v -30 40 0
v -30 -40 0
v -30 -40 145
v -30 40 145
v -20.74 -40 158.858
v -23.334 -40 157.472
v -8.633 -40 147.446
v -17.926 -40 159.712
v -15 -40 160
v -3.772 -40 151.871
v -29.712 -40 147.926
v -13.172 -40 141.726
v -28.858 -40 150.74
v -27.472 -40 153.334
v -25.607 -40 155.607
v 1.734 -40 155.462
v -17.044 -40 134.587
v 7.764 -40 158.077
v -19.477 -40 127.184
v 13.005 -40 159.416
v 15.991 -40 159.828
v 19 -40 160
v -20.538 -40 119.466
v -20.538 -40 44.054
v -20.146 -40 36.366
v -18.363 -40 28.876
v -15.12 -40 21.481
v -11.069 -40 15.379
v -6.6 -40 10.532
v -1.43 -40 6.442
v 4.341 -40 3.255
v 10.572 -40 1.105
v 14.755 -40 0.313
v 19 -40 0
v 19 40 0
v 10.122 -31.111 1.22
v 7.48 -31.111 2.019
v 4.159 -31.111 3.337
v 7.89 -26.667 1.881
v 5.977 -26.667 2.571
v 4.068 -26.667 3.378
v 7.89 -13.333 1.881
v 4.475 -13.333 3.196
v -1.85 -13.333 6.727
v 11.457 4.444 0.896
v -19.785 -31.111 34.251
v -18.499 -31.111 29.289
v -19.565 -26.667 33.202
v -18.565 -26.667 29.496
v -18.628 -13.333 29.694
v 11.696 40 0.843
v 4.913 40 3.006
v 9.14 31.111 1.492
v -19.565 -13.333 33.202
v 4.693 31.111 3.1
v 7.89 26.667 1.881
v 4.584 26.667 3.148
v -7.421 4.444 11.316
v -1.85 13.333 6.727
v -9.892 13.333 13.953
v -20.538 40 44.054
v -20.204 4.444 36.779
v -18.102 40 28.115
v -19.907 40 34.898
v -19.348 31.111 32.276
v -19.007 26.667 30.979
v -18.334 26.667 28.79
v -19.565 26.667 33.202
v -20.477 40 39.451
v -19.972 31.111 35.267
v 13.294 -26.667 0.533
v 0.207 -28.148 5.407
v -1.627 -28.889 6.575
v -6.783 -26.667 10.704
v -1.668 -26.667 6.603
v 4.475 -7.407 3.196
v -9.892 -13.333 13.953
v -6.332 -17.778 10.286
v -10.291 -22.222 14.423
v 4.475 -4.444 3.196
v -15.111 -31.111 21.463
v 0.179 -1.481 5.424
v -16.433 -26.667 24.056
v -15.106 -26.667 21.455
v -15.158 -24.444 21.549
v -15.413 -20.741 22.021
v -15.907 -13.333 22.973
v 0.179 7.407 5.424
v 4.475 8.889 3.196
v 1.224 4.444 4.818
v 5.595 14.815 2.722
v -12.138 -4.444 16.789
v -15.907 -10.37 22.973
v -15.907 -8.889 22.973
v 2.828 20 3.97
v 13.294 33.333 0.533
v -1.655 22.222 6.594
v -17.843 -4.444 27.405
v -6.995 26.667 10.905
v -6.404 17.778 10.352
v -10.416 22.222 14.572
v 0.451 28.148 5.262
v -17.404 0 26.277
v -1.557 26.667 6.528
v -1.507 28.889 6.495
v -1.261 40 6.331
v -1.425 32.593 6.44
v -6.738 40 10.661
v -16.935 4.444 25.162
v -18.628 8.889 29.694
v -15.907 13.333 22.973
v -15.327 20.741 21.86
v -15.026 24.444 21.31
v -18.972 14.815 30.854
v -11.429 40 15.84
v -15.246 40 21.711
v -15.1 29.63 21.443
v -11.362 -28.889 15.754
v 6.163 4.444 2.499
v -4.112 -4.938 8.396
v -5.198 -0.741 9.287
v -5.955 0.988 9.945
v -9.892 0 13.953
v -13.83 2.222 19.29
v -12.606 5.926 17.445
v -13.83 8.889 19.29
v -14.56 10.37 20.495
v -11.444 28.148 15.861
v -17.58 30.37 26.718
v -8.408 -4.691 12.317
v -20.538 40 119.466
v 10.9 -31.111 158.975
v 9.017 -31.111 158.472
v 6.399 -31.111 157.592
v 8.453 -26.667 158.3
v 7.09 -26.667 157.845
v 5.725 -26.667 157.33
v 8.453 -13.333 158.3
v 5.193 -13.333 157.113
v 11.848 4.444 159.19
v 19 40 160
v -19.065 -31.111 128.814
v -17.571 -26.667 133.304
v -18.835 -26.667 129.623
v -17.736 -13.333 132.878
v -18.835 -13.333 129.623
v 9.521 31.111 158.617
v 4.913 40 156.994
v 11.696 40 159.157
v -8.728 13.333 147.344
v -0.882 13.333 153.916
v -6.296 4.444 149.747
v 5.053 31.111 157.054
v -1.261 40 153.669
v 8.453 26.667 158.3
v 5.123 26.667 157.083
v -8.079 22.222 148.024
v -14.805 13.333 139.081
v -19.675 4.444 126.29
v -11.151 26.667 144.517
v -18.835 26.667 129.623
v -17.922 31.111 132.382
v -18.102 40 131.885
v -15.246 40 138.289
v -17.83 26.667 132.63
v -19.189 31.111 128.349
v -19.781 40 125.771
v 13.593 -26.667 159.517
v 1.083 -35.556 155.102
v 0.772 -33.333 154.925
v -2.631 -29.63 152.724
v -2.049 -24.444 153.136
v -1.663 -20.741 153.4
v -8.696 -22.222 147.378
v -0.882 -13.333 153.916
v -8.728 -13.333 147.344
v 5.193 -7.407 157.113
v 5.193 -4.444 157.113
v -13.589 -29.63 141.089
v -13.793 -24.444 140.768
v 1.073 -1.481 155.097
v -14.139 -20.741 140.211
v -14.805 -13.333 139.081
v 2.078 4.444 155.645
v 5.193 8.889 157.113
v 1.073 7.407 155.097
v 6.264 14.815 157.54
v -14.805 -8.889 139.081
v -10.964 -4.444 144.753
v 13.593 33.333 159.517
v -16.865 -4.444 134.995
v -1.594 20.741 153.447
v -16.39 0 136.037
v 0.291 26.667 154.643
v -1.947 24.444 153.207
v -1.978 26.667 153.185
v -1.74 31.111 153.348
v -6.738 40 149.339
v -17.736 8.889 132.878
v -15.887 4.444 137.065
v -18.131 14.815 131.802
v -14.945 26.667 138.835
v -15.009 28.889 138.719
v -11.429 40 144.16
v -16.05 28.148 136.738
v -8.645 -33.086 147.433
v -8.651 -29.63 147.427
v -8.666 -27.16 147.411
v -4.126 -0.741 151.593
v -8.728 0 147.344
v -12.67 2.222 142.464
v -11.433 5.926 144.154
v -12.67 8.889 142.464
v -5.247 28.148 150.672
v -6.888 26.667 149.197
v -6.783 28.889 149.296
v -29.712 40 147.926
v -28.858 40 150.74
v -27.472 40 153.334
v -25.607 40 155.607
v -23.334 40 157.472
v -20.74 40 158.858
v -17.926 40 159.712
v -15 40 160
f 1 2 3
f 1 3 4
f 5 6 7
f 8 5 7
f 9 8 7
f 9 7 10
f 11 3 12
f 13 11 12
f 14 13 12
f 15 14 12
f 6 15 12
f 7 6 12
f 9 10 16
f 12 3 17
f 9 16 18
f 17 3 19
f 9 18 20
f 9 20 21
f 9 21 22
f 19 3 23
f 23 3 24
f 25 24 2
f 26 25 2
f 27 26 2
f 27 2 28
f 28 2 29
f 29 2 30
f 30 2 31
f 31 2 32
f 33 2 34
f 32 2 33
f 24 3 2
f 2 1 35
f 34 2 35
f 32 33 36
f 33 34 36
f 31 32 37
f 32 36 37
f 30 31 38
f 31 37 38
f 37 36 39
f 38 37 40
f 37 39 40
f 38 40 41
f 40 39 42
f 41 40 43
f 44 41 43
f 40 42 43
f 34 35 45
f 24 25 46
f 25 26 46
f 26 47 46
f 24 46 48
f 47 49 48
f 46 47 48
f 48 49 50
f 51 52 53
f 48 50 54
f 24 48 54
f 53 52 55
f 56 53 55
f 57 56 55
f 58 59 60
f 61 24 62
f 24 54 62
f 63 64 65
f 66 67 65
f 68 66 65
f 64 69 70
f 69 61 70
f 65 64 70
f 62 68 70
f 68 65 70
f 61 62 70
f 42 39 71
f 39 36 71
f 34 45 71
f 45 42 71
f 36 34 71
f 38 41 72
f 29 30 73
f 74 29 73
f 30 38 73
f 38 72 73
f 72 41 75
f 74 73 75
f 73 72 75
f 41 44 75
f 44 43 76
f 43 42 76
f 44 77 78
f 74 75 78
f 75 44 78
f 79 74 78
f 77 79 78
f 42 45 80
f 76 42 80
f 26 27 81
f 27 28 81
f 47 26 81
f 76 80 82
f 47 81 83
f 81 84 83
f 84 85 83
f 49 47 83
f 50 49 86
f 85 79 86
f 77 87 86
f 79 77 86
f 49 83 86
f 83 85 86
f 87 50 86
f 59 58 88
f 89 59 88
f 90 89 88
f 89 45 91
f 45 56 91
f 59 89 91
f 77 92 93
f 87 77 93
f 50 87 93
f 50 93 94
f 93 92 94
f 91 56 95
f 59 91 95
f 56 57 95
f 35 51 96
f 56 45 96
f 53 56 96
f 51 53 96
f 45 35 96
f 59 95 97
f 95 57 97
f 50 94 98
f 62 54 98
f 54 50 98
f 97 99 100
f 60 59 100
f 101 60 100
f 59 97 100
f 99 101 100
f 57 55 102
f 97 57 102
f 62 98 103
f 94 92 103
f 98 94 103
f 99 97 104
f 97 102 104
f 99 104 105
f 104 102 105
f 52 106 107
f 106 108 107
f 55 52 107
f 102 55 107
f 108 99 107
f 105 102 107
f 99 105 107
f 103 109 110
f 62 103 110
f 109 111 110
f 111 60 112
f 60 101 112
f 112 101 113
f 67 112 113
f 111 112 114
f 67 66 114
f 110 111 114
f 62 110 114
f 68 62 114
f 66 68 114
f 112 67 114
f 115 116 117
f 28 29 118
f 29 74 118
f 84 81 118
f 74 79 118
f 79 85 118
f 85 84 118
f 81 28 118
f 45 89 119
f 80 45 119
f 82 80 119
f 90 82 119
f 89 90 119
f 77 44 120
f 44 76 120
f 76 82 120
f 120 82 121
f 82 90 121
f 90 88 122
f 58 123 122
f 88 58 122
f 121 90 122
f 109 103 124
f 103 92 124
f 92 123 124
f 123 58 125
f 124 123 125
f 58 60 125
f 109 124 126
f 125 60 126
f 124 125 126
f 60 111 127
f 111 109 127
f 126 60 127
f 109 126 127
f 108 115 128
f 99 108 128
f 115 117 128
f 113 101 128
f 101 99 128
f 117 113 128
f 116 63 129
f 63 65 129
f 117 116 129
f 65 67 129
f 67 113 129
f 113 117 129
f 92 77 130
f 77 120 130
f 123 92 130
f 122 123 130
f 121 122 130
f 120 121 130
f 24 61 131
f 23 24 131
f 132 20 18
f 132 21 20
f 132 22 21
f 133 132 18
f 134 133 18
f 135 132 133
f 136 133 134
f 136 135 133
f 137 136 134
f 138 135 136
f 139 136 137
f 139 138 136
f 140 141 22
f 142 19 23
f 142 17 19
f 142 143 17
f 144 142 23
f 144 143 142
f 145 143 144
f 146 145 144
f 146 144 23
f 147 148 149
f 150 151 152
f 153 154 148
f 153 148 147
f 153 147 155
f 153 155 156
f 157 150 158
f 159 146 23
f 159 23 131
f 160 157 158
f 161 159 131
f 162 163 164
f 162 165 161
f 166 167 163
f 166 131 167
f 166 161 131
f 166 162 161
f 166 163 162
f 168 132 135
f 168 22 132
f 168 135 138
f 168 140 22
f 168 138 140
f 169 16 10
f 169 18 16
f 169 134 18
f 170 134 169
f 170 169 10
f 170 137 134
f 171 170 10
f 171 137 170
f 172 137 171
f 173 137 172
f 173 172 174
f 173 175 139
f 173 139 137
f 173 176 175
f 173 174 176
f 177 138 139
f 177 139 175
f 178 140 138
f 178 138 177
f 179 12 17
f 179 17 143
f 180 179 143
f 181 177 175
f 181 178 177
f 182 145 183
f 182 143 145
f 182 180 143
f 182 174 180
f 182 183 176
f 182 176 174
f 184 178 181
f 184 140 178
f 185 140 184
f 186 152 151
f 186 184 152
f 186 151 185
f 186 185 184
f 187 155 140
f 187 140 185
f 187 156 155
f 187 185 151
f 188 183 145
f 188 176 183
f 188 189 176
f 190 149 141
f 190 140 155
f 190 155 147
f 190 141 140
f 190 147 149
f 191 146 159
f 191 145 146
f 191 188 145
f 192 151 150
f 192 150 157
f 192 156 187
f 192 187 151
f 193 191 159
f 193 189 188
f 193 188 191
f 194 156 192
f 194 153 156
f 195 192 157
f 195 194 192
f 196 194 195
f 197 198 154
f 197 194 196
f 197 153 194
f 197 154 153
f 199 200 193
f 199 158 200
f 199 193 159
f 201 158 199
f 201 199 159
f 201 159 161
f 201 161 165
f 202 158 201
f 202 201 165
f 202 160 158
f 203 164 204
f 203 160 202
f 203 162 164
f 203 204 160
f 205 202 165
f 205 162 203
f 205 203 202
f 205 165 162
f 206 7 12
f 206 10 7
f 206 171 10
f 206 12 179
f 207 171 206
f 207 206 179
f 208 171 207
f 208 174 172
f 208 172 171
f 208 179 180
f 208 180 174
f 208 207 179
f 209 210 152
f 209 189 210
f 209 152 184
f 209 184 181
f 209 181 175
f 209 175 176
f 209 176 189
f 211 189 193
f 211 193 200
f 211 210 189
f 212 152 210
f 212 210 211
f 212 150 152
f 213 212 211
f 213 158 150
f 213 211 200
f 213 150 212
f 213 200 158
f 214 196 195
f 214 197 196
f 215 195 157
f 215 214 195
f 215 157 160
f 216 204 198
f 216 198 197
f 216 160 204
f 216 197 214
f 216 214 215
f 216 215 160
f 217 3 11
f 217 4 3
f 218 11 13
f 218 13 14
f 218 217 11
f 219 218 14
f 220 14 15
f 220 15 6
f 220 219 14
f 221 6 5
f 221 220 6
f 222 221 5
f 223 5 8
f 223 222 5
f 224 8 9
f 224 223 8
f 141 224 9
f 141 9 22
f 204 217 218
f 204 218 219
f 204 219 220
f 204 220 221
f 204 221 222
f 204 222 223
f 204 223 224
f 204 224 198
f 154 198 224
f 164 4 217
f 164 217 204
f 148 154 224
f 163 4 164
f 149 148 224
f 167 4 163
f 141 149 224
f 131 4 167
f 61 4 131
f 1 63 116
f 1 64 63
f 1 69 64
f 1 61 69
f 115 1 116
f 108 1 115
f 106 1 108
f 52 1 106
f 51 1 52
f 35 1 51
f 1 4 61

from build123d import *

# Parameters (mm, degrees)
SKETCH1_W           = 60
SKETCH1_H           = 80
BOSS_EXTRUDE1_DEPTH = 160
CUT_EXTRUDE1_DEPTH  = 182.383571472
FILLET1_R           = 15


with BuildPart() as part:
    # Sketch1 → Boss-Extrude1 (new body)
    with BuildSketch(Plane.XY):
        Rectangle(SKETCH1_W, SKETCH1_H)
    extrude(amount=BOSS_EXTRUDE1_DEPTH)

    # Sketch2 → Cut-Extrude1 (cut, through all)
    with BuildSketch(Plane(origin=(0, 40, 0), x_dir=(1, 0, 0), z_dir=(0, 1, 0))):
        with BuildLine():
            Line((-20.538426818, -44.05376626), (-20.538426818, -80))
            Line((-20.538426818, -80), (30, -80))
            Line((30, -80), (30, 0))
            Line((30, 0), (19, 0))
            add(Edge.make_bspline(
                [(19, 0), (-4.370713607, -0.406174328), (-21.495622782, -22.117426015), (-20.538426818, -44.05376626)],
                knots=[0, 0, 0, 0, 1, 1, 1, 1], degree=3))
        make_face()
        with BuildLine():
            Line((-20.538426818, -80), (-20.538426818, -115.94623374))
            Line((-20.538426818, -115.94623374), (-20.538426818, -119.465924684))
            add(Edge.make_bspline(
                [(19, -160), (-3.118929784, -159.61558121), (-19.643213017, -140.147251157), (-20.538426818, -119.465924684)],
                knots=[0, 0, 0, 0, 0.946437929, 0.946437929, 0.946437929, 0.946437929], degree=3))
            Line((19, -160), (30, -160))
            Line((30, -160), (30, -80))
            Line((30, -80), (-20.538426818, -80))
        make_face()
    extrude(amount=-CUT_EXTRUDE1_DEPTH, mode=Mode.SUBTRACT)

    # Fillet1
    fillet1_edges = [part.edges().sort_by_distance(p)[0] for p in [
        (-30, 0, 160),
    ]]
    fillet(fillet1_edges, radius=FILLET1_R)


solid = part.part
